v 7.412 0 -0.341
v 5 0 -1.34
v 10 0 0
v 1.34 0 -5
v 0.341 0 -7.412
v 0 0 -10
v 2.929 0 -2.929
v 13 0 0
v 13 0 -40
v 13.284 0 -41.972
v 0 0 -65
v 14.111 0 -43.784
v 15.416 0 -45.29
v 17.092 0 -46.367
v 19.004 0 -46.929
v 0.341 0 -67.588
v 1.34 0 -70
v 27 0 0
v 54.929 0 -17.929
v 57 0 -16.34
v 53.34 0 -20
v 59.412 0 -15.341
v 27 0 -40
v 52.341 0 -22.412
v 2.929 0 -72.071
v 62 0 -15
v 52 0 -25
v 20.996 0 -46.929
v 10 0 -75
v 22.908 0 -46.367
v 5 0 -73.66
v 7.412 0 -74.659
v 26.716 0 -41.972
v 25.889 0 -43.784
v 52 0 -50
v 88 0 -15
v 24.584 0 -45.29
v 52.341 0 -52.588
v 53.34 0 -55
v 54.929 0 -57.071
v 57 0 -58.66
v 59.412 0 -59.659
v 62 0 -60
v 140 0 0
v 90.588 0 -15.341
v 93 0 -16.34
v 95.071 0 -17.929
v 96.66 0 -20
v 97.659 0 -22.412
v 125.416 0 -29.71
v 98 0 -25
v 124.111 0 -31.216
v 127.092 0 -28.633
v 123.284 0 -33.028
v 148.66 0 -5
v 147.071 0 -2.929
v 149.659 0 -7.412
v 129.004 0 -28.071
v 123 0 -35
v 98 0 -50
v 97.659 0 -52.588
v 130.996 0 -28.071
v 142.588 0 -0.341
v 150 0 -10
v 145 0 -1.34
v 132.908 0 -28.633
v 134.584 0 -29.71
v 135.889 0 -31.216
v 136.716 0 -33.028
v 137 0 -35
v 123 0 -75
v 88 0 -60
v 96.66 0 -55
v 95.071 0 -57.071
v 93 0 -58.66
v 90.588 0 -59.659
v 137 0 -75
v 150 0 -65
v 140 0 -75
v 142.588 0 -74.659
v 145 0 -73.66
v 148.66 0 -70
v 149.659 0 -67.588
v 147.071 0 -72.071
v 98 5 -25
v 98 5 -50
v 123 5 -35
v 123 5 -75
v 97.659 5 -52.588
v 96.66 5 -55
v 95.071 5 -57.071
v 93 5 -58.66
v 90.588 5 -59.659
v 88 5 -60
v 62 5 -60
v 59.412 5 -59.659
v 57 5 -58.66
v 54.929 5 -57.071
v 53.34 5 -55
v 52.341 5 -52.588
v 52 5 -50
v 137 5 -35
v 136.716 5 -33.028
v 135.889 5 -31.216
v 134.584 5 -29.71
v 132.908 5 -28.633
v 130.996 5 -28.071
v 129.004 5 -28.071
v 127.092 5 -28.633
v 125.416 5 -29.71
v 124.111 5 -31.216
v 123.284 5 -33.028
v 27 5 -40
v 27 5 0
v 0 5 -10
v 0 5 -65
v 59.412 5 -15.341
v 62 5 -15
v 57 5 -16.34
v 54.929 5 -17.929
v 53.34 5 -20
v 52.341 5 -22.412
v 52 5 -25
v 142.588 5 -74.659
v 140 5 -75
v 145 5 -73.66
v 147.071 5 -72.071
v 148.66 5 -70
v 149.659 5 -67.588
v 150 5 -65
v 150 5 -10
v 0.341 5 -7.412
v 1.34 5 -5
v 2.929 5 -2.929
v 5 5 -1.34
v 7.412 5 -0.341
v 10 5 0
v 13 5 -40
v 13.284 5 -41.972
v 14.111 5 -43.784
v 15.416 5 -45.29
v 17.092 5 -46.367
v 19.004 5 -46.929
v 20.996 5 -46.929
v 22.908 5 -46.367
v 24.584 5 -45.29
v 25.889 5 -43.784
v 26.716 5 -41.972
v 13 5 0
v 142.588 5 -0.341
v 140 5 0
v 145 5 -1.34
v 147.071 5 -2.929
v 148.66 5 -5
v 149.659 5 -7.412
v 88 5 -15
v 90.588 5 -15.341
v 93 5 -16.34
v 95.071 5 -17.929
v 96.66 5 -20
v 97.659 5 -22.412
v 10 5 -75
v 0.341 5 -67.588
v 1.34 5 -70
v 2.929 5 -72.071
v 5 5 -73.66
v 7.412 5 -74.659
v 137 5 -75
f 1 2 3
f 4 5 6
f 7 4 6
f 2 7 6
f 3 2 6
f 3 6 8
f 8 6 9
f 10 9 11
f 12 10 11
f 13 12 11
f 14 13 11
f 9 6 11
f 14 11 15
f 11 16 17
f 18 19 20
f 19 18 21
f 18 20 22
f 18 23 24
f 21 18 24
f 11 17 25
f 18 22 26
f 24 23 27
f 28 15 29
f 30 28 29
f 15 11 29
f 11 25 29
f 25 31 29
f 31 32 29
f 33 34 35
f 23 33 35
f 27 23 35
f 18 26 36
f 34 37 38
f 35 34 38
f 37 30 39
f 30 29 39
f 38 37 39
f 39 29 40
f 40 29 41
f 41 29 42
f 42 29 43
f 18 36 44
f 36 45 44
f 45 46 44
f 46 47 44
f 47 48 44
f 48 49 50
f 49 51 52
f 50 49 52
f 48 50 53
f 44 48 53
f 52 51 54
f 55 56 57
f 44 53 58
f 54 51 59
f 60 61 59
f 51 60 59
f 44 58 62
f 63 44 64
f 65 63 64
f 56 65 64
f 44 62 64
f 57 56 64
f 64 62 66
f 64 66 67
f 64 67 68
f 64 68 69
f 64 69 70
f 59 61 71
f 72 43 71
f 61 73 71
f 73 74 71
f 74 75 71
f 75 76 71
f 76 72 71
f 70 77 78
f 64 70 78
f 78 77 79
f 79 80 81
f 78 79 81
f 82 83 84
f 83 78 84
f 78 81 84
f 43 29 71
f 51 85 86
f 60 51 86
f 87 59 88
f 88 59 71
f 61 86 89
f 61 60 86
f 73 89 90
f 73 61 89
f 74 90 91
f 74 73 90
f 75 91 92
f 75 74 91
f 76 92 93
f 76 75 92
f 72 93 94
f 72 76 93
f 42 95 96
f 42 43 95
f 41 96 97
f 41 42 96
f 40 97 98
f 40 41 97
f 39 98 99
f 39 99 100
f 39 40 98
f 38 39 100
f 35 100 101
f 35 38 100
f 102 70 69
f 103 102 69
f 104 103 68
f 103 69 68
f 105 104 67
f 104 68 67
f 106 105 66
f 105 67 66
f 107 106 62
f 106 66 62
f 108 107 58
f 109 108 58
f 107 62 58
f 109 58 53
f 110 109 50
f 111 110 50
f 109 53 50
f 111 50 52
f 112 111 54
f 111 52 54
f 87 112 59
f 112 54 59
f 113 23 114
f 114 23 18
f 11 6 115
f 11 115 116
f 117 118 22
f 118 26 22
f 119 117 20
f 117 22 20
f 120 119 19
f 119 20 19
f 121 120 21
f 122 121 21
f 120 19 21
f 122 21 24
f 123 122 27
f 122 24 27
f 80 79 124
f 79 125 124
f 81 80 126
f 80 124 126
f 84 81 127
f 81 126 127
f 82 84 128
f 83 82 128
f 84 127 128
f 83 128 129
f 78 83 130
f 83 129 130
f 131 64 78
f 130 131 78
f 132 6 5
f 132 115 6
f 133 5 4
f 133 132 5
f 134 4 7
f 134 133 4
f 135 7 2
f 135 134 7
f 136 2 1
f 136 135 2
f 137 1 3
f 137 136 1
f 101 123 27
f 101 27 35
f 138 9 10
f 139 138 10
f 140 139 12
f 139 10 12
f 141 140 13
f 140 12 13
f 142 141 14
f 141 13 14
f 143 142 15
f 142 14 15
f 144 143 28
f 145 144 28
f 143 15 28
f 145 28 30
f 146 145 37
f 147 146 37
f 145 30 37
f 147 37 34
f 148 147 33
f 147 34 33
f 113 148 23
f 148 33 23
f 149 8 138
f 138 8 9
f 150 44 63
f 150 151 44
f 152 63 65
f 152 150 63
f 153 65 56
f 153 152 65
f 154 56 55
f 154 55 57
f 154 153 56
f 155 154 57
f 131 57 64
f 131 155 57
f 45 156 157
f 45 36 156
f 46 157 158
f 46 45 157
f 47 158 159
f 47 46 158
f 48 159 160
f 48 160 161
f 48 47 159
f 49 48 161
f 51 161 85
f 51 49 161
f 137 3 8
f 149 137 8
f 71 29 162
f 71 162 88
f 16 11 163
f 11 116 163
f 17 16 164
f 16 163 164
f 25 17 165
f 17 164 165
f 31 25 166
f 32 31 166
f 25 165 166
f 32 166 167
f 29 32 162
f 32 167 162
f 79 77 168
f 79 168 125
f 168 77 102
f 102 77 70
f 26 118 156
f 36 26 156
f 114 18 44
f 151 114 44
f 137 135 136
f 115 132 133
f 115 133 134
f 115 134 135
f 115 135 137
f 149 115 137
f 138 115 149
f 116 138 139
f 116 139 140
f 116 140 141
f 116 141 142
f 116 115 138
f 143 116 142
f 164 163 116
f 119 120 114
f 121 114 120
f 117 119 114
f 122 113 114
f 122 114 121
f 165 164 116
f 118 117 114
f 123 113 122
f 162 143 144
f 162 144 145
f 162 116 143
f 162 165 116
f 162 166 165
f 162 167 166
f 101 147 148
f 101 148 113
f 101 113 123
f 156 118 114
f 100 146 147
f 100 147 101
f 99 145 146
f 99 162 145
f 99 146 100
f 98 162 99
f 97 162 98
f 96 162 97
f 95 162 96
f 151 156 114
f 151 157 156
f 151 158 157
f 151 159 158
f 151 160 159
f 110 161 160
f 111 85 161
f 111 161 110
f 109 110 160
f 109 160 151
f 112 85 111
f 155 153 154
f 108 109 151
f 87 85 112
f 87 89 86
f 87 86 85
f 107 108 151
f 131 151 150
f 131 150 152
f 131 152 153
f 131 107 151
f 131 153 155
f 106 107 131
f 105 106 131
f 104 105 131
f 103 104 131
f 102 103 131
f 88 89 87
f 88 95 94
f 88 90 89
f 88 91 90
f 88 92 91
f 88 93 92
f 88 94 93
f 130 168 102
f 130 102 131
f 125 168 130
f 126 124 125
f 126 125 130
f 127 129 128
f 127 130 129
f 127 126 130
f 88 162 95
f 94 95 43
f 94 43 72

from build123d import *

# Parameters (mm, degrees)
SKETCH2_W               = 150
SKETCH2_H               = 75
BOSS_EXTRUDE1_DEPTH     = 5
CUT_EXTRUDE1_DEPTH      = 168.779617356
CUT_EXTRUDE1_DEPTH_BACK = 168.779617356
SKETCH4_W               = 46
SKETCH4_H               = 45
CUT_EXTRUDE2_DEPTH      = 168.779617356
FILLET1_R               = 10
FILLET2_R               = 10


with BuildPart() as part:
    # Sketch2 → Boss-Extrude1 (new body)
    with BuildSketch(Plane(origin=(0, 0, 0), x_dir=(1, 0, 0), z_dir=(0, 1, 0))):
        with Locations((75, 37.5)):
            Rectangle(SKETCH2_W, SKETCH2_H)
    extrude(amount=BOSS_EXTRUDE1_DEPTH)

    # Sketch3 → Cut-Extrude1 (cut, two sides: drawn at the far end of the back side and taken through both)
    with BuildSketch(Plane(origin=(0, 5, 0), x_dir=(1, 0, 0), z_dir=(0, 1, 0)).offset(-CUT_EXTRUDE1_DEPTH_BACK)):
        with BuildLine():
            Line((13, 0), (13, 40))
            ThreePointArc((13, 40), (20, 47), (27, 40))
            Line((27, 40), (27, 0))
            Line((27, 0), (13, 0))
        make_face()
        with BuildLine():
            Line((137, 75), (137, 35))
            ThreePointArc((137, 35), (130, 28), (123, 35))
            Line((123, 35), (123, 75))
            Line((123, 75), (137, 75))
        make_face()
    extrude(amount=CUT_EXTRUDE1_DEPTH + CUT_EXTRUDE1_DEPTH_BACK, mode=Mode.SUBTRACT)

    # Sketch4 → Cut-Extrude2 (cut, through all)
    with BuildSketch(Plane(origin=(0, 5, 0), x_dir=(1, 0, 0), z_dir=(0, 1, 0))):
        with Locations((75, 37.5)):
            Rectangle(SKETCH4_W, SKETCH4_H)
    extrude(amount=-CUT_EXTRUDE2_DEPTH, mode=Mode.SUBTRACT)

    # Fillet1
    fillet1_edges = [part.edges().sort_by_distance(p)[0] for p in [
        (0, 2.5, 0),
        (0, 2.5, -75),
        (150, 2.5, -75),
        (150, 2.5, 0),
    ]]
    fillet(fillet1_edges, radius=FILLET1_R)

    # Fillet2
    fillet2_edges = [part.edges().sort_by_distance(p)[0] for p in [
        (52, 2.5, -15),
        (52, 2.5, -60),
        (98, 2.5, -60),
        (98, 2.5, -15),
    ]]
    fillet(fillet2_edges, radius=FILLET2_R)


solid = part.part
